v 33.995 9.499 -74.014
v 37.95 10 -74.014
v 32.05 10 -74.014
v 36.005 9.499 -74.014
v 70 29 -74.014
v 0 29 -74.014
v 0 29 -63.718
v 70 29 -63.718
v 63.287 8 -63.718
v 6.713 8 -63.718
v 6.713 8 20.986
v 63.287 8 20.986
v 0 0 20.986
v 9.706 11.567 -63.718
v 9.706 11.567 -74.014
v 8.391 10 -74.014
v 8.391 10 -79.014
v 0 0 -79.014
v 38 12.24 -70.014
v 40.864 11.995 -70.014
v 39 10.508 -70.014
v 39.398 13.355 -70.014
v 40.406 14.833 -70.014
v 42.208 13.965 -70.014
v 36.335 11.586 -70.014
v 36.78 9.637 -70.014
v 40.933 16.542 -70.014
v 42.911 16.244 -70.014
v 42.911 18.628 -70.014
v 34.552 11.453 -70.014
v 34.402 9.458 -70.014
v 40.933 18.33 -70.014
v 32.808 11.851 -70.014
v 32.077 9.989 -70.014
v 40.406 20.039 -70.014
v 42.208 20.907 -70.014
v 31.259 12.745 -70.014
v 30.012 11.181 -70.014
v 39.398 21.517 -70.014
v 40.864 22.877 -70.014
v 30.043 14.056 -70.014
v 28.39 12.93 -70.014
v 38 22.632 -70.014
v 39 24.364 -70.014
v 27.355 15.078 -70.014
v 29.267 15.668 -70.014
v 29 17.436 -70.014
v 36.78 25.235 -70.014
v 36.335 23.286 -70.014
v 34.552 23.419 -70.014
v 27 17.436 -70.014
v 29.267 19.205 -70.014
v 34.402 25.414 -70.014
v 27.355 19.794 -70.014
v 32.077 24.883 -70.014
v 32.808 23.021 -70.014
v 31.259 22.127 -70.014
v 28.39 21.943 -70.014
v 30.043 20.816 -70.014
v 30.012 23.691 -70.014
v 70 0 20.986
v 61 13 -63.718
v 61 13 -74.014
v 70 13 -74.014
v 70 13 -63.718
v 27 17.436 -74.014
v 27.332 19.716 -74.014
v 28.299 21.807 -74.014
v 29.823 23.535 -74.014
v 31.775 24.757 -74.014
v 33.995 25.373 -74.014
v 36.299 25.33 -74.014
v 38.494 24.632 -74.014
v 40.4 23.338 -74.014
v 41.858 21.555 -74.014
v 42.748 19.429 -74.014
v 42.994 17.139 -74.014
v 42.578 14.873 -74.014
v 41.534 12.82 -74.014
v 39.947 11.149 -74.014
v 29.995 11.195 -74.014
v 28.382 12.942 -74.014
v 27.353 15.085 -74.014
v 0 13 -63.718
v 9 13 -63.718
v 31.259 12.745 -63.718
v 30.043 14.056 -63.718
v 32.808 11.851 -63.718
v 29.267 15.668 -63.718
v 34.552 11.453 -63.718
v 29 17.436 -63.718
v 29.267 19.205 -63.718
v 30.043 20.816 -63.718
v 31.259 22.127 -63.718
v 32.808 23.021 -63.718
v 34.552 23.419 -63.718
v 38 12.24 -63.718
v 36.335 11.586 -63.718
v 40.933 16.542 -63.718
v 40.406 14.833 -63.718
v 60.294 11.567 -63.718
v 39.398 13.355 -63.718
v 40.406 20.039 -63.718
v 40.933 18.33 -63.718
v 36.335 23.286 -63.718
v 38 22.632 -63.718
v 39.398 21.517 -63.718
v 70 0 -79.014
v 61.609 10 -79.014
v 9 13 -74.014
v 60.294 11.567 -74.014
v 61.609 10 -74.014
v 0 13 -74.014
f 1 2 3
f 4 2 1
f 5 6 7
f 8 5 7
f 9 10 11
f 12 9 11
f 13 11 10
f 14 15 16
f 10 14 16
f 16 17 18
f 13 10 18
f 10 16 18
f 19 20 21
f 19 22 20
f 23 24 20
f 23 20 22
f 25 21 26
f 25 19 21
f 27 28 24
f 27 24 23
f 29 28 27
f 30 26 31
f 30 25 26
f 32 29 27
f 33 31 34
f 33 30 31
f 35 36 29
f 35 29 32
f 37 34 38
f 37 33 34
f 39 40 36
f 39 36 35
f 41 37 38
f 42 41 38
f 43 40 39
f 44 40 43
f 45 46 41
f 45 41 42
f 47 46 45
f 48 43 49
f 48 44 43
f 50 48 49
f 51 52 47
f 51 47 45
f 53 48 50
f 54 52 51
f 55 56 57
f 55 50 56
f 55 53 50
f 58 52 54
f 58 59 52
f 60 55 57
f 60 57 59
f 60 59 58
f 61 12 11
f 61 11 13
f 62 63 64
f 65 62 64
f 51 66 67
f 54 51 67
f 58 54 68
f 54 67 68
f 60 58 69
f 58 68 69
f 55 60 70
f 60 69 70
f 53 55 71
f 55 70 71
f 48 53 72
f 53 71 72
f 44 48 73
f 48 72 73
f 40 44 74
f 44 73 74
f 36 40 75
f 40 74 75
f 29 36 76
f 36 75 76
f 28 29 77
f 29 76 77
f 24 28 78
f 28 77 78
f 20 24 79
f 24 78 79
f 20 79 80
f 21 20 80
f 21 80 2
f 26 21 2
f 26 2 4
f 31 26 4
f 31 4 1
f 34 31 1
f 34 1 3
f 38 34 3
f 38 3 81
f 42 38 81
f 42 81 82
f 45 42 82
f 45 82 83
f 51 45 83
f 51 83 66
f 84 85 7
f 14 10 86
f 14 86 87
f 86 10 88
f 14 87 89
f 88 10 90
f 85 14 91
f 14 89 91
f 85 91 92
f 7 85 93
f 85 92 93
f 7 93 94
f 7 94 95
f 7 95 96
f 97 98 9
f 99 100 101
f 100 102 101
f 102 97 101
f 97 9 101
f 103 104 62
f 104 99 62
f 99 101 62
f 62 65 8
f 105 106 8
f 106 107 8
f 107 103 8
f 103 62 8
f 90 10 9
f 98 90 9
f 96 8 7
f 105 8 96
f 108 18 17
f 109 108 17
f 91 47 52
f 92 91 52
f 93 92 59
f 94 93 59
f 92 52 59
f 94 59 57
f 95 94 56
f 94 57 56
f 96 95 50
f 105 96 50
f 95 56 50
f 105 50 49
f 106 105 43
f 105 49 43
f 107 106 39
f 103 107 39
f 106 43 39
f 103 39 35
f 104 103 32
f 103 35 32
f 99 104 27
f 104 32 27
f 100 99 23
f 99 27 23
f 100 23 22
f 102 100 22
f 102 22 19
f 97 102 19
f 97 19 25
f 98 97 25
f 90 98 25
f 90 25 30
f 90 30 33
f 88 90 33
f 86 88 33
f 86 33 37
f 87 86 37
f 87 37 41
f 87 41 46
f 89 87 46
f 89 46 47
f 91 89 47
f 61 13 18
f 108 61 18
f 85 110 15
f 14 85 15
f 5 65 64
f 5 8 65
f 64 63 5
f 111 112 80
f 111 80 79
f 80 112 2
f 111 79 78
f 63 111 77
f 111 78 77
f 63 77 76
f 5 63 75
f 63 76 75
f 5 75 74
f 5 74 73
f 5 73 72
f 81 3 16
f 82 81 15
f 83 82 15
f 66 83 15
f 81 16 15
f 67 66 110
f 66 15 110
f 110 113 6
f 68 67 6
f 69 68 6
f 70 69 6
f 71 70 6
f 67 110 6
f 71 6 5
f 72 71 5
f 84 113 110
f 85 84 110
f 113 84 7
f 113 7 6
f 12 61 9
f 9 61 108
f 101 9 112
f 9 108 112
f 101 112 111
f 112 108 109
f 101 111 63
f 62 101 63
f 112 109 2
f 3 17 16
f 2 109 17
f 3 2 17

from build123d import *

# Parameters (mm, degrees)
EXTRUDE_1_DEPTH     = 70
CUT_EXTRUDE_1_DEPTH = 163
SKETCH_3_W          = 5
SKETCH_3_H          = 28.984249348
CUT_EXTRUDE_2_DEPTH = 74.198677084
SKETCH_4_W          = 20.259313124
SKETCH_4_H          = 10.192966915
CUT_EXTRUDE_3_DEPTH = 77.198677084
SKETCH_5_W          = 22.578654877
SKETCH_5_H          = 21
CUT_EXTRUDE_4_DEPTH = 77
SKETCH_7_R          = 6
CUT_EXTRUDE_5_DEPTH = 37
SKETCH_8_R          = 8
CUT_EXTRUDE_6_DEPTH = 4


with BuildPart() as part:
    # Эскиз1 → Бобышка-Вытянуть1 (new body)
    with BuildSketch(Plane(origin=(0, 0, 0), x_dir=(0, 0, -1), z_dir=(1, 0, 0))):
        with BuildLine():
            Line((-20.986257223, 0), (79.013742777, 0))
            Line((79.013742777, 0), (79.013742777, 32))
            ThreePointArc((79.013742777, 32), (77.549276683, 35.535533906), (74.013742777, 37))
            Line((74.013742777, 37), (71.922596638, 37))
            ThreePointArc((71.922596638, 37), (69.613853571, 36.435054166), (67.826836416, 34.867882182))
            Line((67.826836416, 34.867882182), (49.013742777, 8))
            Line((49.013742777, 8), (-20.986257223, 8))
            Line((-20.986257223, 8), (-20.986257223, 0))
        make_face()
    extrude(amount=EXTRUDE_1_DEPTH)

    # Эскиз2 → Вырез-Вытянуть1 (cut)
    with BuildSketch(Plane(origin=(0, 0, -79.013742777), x_dir=(-1, 0, 0), z_dir=(0, 0, -1))):
        Polygon((-61, 13), (-70, 13), (-70, 0), (-60.293754471, 11.56745298), align=None)
        Polygon((-9, 13), (-9.706245529, 11.56745298), (0, 0), (0, 13), align=None)
    extrude(amount=-CUT_EXTRUDE_1_DEPTH, mode=Mode.SUBTRACT)

    # Эскиз3 → Вырез-Вытянуть2 (cut)
    with BuildSketch(Plane.ZY):
        with Locations((-76.513742777, 24.492124674)):
            Rectangle(SKETCH_3_W, SKETCH_3_H)
    extrude(amount=-CUT_EXTRUDE_2_DEPTH, mode=Mode.SUBTRACT)

    # Эскиз4 → Вырез-Вытянуть3 (cut)
    with BuildSketch(Plane.ZY):
        with Locations((-65.118798198, 34.096483457)):
            Rectangle(SKETCH_4_W, SKETCH_4_H)
    extrude(amount=-CUT_EXTRUDE_3_DEPTH, mode=Mode.SUBTRACT)

    # Эскиз5 → Вырез-Вытянуть4 (cut)
    with BuildSketch(Plane(origin=(70, 0, 0), x_dir=(0, 0, -1), z_dir=(1, 0, 0))):
        with Locations((52.428773641, 18.5)):
            Rectangle(SKETCH_5_W, SKETCH_5_H)
    extrude(amount=-CUT_EXTRUDE_4_DEPTH, mode=Mode.SUBTRACT)

    # Эскиз7 → Вырез-Вытянуть5 (cut)
    with BuildSketch(Plane(origin=(0, 0, -74.013742777), x_dir=(-1, 0, 0), z_dir=(0, 0, -1))):
        with Locations((-35, 17.436066506)):
            Circle(SKETCH_7_R)
    extrude(amount=-CUT_EXTRUDE_5_DEPTH, mode=Mode.SUBTRACT)

    # Эскиз8 → Вырез-Вытянуть6 (cut)
    with BuildSketch(Plane(origin=(0, 0, -74.013742777), x_dir=(-1, 0, 0), z_dir=(0, 0, -1))):
        with Locations((-35, 17.436066506)):
            Circle(SKETCH_8_R)
    extrude(amount=-CUT_EXTRUDE_6_DEPTH, mode=Mode.SUBTRACT)


solid = part.part
